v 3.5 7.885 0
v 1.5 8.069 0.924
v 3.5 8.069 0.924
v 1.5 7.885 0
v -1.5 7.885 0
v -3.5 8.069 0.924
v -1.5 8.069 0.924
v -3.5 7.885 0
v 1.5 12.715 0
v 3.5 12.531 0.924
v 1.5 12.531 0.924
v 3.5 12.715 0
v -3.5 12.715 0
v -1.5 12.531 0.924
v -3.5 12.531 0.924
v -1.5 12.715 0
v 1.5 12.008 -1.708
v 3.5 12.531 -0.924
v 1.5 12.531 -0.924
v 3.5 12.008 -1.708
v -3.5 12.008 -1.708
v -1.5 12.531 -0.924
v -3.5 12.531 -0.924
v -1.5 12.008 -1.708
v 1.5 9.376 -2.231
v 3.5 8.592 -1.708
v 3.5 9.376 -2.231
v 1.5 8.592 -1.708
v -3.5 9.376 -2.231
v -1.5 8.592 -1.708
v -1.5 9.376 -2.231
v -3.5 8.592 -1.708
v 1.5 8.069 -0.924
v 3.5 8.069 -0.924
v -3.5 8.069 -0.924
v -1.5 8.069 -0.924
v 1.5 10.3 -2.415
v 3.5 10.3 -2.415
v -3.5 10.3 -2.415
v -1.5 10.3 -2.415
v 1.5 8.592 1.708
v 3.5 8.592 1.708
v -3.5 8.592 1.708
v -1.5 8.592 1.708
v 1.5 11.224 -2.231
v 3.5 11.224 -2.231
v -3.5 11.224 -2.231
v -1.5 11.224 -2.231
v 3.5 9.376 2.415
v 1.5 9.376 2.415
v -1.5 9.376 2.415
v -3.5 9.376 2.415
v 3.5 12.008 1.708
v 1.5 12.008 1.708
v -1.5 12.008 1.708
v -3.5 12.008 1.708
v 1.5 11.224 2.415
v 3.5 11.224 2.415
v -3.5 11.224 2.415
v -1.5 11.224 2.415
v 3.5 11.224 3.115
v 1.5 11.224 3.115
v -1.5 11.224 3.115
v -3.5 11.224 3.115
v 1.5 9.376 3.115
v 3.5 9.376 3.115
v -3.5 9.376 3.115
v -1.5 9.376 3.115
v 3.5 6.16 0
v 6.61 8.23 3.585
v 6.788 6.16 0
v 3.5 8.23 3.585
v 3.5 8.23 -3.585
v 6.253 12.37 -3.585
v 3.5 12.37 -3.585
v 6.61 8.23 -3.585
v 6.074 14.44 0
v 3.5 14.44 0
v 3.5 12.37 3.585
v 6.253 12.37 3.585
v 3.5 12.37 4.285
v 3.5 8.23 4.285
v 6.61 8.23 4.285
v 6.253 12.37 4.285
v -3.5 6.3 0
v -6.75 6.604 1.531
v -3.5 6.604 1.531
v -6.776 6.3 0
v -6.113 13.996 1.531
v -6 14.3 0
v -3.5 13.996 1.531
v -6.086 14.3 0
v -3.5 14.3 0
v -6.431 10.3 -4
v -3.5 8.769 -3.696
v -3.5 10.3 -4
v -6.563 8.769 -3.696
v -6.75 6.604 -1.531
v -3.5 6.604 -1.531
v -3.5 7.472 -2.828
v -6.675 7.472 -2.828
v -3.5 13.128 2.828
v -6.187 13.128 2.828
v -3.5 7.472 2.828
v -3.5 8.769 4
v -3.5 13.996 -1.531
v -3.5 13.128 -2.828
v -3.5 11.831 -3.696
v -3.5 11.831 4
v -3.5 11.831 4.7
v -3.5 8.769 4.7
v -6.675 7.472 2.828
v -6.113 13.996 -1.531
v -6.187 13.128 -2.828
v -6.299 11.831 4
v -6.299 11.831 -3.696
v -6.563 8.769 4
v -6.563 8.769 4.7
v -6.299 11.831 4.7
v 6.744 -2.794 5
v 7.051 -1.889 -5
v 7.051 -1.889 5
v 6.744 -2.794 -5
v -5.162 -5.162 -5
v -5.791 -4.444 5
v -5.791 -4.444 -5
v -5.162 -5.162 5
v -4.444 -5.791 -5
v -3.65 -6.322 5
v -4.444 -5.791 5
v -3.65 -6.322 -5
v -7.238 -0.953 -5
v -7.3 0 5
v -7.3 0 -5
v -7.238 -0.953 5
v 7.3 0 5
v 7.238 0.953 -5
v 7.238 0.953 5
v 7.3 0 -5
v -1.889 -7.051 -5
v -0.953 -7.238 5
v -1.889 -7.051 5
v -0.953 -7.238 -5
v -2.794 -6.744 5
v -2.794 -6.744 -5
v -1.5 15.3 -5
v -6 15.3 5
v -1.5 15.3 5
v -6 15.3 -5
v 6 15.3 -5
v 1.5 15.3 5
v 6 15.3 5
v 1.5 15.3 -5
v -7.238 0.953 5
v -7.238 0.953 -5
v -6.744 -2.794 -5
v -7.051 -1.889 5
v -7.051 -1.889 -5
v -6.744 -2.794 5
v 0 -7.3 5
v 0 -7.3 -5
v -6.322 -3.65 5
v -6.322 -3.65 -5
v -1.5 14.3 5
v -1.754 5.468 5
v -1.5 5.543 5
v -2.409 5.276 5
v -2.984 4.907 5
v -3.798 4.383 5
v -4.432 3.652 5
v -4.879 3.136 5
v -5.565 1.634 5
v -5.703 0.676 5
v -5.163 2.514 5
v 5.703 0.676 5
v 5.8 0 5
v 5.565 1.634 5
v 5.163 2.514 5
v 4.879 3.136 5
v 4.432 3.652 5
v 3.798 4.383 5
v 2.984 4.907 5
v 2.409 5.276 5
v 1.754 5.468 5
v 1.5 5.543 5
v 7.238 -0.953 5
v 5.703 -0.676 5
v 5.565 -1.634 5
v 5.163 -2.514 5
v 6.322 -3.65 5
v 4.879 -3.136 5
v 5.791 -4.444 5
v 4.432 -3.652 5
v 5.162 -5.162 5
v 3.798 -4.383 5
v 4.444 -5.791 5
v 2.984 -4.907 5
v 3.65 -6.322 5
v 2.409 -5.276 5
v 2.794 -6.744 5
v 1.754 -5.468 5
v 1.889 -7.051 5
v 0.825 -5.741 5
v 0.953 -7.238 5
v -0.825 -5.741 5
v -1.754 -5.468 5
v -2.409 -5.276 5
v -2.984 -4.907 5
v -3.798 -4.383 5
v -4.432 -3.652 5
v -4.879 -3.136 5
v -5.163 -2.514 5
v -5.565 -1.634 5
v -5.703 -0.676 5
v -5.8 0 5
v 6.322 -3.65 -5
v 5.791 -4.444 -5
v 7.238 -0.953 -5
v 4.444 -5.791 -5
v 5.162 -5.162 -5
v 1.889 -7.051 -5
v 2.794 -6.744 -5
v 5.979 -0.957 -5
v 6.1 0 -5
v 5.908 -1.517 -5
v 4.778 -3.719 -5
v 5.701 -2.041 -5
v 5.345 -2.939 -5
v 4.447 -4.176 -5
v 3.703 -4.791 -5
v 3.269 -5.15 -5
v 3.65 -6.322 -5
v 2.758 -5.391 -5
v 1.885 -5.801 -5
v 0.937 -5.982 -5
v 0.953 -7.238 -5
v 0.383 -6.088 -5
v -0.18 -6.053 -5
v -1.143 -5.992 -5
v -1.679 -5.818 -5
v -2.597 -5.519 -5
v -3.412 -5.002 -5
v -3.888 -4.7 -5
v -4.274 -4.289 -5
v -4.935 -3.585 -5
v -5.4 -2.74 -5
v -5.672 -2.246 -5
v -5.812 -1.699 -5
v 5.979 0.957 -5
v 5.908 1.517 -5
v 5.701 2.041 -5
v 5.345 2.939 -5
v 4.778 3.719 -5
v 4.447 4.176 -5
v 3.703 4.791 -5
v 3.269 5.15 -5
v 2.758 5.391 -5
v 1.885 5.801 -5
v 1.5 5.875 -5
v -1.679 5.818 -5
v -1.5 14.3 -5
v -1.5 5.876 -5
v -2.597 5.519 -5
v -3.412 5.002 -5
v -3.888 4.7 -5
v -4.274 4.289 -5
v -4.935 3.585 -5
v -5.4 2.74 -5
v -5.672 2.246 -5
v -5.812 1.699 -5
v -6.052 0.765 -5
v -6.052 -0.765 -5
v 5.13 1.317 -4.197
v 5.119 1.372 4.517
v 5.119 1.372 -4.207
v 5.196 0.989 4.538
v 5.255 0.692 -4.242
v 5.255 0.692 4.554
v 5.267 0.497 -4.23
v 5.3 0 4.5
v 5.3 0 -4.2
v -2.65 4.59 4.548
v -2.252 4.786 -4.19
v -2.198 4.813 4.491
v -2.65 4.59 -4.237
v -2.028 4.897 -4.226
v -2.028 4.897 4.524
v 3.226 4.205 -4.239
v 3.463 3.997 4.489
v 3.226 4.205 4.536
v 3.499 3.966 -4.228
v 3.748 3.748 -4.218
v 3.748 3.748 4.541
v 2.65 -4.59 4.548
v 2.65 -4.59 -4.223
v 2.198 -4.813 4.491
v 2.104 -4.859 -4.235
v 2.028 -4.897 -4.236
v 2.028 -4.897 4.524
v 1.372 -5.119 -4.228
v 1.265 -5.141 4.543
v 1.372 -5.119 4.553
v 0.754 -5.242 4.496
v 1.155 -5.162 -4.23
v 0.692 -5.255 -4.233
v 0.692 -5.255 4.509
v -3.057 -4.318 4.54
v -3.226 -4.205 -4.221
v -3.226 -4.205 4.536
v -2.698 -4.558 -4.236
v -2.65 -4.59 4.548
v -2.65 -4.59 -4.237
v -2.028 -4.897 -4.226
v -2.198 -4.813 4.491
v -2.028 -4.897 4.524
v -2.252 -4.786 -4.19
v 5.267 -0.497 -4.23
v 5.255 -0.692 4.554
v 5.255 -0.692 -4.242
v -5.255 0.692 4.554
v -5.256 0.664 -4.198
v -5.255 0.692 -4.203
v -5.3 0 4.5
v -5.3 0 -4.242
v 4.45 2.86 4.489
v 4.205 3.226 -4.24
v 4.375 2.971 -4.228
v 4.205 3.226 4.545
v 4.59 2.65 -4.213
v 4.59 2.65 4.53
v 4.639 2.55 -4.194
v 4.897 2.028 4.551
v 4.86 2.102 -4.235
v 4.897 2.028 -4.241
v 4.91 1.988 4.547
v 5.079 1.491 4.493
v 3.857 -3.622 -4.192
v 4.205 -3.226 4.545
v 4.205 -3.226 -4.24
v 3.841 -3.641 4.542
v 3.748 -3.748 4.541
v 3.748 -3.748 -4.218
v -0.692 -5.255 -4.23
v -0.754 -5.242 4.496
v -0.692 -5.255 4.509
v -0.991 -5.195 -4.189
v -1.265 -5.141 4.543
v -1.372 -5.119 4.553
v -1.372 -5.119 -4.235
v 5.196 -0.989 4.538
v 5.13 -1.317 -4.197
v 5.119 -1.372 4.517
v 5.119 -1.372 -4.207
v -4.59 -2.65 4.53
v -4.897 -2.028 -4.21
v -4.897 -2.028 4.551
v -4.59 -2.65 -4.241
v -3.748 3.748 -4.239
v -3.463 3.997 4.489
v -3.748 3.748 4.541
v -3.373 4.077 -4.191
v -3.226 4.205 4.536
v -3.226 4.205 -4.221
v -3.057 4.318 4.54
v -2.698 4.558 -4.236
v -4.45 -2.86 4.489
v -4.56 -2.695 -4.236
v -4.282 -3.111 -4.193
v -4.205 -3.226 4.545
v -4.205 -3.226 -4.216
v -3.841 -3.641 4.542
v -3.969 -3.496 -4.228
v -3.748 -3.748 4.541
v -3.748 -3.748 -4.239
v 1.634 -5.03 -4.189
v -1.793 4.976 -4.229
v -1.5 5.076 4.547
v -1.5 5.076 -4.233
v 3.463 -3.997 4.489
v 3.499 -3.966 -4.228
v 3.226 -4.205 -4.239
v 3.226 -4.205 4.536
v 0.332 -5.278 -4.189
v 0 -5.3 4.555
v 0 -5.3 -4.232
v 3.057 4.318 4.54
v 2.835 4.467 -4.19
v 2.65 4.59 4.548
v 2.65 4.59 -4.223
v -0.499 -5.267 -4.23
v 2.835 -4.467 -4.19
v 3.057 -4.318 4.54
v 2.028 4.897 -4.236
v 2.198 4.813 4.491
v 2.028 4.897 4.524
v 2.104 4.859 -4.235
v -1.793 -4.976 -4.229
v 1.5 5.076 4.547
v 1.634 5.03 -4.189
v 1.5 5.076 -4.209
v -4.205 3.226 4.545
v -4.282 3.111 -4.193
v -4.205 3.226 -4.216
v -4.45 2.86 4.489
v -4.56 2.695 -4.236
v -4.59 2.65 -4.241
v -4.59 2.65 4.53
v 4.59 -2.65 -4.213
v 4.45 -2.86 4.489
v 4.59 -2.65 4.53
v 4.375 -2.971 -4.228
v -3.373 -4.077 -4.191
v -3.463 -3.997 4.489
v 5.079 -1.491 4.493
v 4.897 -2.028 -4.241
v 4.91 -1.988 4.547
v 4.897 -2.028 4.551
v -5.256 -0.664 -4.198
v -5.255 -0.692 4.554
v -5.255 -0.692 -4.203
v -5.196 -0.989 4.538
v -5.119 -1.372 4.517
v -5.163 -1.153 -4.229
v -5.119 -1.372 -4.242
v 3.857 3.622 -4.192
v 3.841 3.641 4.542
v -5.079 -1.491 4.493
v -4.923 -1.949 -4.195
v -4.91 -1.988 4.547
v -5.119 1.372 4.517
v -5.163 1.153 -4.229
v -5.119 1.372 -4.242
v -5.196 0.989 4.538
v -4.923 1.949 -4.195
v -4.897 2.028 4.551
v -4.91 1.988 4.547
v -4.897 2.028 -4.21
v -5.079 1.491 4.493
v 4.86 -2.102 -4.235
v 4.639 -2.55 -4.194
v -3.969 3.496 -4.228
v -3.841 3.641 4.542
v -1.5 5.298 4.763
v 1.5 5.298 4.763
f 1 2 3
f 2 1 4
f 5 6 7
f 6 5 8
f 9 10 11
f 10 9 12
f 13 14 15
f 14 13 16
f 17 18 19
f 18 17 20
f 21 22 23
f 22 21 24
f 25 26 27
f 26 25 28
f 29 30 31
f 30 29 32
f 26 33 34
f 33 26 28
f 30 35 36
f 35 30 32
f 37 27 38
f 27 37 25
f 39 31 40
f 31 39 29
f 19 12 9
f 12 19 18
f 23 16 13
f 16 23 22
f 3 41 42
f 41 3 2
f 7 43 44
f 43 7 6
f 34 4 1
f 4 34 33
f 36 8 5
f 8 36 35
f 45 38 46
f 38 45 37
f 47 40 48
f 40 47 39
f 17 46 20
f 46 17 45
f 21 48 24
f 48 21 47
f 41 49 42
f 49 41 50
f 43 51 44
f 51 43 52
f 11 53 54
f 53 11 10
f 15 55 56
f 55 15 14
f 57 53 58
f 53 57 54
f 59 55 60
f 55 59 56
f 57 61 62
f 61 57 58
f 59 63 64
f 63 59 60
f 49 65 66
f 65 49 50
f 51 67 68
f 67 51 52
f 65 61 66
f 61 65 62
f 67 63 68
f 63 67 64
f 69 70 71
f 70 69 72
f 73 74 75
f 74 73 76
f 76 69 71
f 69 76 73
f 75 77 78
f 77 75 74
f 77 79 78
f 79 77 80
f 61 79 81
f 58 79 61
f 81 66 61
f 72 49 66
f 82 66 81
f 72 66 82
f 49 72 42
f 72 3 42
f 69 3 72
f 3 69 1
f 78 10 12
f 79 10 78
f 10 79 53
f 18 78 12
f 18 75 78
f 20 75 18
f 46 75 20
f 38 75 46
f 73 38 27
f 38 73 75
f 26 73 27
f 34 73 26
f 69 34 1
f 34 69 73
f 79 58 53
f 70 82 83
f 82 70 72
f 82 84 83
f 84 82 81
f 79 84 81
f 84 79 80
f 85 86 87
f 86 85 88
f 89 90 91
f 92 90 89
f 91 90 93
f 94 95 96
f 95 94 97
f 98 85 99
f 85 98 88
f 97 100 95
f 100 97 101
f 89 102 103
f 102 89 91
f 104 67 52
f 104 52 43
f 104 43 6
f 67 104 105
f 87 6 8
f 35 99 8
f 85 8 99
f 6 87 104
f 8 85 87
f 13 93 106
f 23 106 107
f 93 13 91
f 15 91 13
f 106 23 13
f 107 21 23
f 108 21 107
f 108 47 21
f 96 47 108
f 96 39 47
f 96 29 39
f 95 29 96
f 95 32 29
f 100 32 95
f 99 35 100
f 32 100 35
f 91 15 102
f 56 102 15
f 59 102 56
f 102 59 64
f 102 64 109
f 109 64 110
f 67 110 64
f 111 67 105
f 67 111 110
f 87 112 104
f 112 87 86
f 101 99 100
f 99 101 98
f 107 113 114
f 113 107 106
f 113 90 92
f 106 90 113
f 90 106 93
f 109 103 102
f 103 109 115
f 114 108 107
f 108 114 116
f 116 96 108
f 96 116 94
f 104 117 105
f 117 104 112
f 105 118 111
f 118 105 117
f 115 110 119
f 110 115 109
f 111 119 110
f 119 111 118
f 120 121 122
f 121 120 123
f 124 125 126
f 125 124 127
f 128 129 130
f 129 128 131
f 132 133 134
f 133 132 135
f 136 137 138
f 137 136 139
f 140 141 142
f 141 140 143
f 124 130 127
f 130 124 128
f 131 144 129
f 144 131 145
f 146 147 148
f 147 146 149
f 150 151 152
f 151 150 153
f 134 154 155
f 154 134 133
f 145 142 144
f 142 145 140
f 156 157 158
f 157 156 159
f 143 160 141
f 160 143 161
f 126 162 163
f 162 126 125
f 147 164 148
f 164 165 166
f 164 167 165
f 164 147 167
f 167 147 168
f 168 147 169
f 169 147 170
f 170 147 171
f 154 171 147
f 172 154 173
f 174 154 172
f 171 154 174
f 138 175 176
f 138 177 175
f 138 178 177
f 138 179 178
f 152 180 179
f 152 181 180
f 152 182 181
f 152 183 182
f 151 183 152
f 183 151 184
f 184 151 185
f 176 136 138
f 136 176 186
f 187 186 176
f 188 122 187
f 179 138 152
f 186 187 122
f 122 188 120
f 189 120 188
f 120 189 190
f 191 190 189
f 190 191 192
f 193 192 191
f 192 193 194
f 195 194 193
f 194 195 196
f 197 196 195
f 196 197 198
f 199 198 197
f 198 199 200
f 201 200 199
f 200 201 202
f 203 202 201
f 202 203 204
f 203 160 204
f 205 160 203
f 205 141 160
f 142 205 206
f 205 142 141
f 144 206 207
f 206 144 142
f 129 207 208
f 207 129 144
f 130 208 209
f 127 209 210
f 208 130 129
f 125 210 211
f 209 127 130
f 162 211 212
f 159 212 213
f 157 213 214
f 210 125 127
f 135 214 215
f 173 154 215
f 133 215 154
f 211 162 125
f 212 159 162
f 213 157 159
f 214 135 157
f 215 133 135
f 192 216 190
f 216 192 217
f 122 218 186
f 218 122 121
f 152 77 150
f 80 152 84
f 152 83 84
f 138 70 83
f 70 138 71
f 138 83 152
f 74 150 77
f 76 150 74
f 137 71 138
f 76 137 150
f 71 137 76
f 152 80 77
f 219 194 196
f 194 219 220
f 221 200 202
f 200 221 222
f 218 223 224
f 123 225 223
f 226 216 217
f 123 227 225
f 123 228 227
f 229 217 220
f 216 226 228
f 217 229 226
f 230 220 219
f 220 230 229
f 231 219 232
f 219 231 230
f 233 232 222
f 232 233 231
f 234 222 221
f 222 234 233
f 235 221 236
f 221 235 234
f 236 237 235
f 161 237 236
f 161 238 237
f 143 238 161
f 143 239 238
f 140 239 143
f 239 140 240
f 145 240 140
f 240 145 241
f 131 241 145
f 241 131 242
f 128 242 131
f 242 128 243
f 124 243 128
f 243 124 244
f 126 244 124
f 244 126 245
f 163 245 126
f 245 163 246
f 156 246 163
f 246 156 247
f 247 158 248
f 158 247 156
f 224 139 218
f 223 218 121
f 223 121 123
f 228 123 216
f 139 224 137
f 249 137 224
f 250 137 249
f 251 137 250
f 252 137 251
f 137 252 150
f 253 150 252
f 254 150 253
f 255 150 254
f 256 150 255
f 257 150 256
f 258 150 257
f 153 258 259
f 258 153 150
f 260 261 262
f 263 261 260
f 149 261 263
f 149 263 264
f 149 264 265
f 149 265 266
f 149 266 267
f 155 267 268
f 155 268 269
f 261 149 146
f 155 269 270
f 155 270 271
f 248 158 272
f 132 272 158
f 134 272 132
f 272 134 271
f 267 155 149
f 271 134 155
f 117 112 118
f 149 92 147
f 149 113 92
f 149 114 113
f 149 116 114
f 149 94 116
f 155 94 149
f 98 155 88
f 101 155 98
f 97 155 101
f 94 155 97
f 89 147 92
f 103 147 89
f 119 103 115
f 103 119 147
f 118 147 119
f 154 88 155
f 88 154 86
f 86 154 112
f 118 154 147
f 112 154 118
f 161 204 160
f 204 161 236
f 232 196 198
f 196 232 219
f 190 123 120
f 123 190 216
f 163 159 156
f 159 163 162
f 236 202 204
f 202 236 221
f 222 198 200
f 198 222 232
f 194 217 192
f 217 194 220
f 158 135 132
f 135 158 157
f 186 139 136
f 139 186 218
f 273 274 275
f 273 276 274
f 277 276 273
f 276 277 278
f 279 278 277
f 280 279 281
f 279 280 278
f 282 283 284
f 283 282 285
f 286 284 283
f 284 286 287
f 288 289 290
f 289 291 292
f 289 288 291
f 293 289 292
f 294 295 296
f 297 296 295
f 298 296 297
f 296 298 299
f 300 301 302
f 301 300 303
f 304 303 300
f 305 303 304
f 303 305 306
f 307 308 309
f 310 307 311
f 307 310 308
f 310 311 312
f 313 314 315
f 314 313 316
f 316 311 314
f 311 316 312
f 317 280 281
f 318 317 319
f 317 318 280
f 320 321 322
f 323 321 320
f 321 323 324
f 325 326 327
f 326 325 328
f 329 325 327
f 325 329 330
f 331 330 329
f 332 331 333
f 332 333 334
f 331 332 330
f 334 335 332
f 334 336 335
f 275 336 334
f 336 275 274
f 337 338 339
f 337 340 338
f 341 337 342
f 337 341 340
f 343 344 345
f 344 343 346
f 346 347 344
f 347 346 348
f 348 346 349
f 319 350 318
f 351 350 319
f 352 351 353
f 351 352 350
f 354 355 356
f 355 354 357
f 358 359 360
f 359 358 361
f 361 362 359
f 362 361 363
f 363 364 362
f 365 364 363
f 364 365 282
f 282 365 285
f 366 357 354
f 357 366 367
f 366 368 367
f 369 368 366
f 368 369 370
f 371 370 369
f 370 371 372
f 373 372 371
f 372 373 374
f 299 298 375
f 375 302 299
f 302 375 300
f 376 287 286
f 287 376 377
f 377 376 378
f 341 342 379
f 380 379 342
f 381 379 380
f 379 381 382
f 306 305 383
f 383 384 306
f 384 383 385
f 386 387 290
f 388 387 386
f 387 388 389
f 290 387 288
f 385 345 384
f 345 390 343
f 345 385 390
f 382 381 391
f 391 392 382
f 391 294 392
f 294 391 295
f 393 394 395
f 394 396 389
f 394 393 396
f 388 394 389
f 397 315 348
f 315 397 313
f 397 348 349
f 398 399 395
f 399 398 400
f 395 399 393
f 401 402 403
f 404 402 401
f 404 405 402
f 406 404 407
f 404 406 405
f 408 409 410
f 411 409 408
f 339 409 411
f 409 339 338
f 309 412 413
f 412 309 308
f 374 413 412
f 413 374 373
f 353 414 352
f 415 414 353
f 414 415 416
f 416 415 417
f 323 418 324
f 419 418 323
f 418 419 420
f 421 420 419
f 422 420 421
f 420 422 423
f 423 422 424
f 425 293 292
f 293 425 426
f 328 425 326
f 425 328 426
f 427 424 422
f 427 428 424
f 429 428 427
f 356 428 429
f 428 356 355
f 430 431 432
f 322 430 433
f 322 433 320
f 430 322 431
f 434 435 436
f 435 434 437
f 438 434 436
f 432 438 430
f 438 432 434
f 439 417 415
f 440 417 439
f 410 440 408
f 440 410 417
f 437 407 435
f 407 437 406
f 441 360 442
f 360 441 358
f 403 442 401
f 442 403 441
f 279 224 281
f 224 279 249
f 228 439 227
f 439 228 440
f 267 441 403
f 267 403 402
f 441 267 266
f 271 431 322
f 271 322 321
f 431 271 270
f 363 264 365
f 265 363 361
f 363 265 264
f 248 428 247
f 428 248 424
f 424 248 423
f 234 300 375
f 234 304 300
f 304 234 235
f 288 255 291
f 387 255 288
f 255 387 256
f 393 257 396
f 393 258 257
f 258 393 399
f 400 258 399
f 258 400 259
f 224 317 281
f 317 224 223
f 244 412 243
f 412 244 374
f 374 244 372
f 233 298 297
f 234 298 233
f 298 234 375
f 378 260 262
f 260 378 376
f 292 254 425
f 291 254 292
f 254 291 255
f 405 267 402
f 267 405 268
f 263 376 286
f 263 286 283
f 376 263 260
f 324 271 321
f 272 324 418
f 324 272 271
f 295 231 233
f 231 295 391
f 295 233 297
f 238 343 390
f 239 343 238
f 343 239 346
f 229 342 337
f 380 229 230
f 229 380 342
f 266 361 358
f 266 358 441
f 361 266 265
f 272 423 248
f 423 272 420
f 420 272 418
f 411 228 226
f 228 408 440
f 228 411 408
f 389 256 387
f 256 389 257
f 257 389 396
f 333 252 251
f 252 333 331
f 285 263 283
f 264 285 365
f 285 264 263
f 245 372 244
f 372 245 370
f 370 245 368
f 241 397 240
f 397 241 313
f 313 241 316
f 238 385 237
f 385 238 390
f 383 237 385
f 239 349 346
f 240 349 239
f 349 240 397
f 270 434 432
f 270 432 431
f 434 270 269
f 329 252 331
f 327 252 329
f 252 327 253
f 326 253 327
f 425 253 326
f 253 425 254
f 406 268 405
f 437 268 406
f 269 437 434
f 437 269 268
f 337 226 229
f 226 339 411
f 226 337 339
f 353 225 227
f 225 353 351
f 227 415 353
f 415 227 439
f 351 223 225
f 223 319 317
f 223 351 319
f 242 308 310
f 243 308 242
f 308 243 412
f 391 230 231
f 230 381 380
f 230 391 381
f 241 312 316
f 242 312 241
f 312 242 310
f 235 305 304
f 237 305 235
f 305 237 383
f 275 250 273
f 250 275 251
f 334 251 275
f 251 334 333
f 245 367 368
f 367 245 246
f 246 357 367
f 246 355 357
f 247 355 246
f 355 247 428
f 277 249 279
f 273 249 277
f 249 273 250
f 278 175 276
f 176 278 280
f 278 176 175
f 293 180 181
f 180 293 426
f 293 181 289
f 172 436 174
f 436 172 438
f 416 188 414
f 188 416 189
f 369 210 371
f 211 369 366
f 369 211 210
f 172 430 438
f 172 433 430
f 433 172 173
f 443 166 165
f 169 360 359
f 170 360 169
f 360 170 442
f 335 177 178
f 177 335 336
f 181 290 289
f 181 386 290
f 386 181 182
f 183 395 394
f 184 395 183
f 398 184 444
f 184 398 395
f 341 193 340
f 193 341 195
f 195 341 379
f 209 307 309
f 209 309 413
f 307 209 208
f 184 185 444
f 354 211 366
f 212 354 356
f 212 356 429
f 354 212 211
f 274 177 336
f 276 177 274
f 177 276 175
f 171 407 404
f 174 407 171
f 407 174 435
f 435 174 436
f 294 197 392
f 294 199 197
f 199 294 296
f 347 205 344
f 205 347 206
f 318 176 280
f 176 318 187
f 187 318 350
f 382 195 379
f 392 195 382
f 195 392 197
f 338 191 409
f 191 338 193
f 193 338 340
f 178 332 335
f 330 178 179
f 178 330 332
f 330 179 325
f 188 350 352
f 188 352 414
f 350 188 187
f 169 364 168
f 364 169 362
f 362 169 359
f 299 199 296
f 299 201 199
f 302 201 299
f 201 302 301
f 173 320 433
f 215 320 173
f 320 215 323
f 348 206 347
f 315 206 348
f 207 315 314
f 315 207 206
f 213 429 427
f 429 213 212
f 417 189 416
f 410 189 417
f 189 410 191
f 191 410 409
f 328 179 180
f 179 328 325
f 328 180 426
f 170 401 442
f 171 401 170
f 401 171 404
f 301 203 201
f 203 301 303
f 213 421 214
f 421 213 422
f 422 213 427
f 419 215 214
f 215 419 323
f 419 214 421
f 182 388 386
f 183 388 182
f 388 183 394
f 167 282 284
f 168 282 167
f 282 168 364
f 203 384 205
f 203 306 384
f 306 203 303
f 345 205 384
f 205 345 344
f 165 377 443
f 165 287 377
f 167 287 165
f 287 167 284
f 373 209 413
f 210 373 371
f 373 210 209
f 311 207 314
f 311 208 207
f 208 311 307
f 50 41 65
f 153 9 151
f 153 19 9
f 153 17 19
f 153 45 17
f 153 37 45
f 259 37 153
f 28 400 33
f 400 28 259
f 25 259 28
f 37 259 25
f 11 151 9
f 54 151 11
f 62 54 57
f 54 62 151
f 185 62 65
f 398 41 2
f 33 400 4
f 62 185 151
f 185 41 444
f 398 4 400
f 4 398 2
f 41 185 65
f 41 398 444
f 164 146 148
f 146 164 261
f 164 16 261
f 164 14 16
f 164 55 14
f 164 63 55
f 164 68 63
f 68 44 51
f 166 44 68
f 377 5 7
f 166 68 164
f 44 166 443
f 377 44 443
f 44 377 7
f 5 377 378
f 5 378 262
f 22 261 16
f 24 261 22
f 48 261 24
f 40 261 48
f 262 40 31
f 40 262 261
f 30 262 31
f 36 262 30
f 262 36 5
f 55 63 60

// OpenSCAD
// file: cylinder_clip.scad
use <../utilities.scad>;

module cylinder_clip(r=1,t=3,opening_angle=120,wing_length=2,wing_angle=45,flat_w=10,flat_t=3,h=10,$fn=$fn){
	union(){
		difference(){
			hull(){
				cylinder(r=r+t,$fn=$fn,h=h);
				translate([-flat_w/2,-r-flat_t,0]) cube([flat_w,0.1,h]);
			}
			cylinder(r=r,$fn=$fn,h=99999,center=true);
			cylinder(r1=r+2,r2=r,$fn=$fn,h=2,center=true);
			scale([tan(opening_angle/2),1,1]) rotate([0,0,45]) translate([0,0,-1]) cube([1,1,1]*9999);
		}
		reflect([1,0,0]) translate([sin(opening_angle/2),cos(opening_angle/2),0]*(r+t/2)) hull() repeat([sin(wing_angle),cos(wing_angle),0]*wing_length,2)
			cylinder(r=t/2,h=h,$fn=16);
			
	}
}

//cylinder_clip(r=3,t=2,flat_w=6);
union(){
	cylinder_clip(r=21,t=4.5,flat_t=10,opening_angle=100,$fn=64);
	translate([-5,-22-5-20,0]) cube([10,20,10]);
}
// file: ../standard_optomechanics/cylinder_clamp.scad
use <../utilities.scad>;
d=0.05;

//for 1 inch/25mm post clamp, an inner radius of 12.8 is good.
	
module cylinder_clamp(
	inner_r=12.8, //radius of the cylinder being clamped (ish!)
	clamp_h=11, //thicknedess of the clamp along the cylinder axis
	clamp_t=4, //thickness of the clamp radially
	flat_t=8, //how thick the bottom of the clamp is (often need to allow for the mounting bolt head here)
	flat_width=15, //width of the flat base
	mounting_bolt=4, //nominal size of mounting bolt (default is 4 for M4, 0 to disable)
	nut_trap=false,
	bevel_top=0.5, //size of 45 degree bevel on top surface
	bevel_bottom=0.8 //size of 45 degree bevel on bottom of hole
	){
	assign(
		post_r = inner_r, //poor initial choice of name!
		bolt_flat_w=10, //width of the region where the bolt is
		gap_w=3 //size of the gap that is squeezed by the bolt
	)
	difference(){
		hull(){
			cylinder(h=clamp_h,r=post_r+clamp_t,center=true,$fn=48);
			translate([0,-post_r-flat_t/2,0]) cube([flat_width,flat_t,clamp_h],center=true);
			translate([0,post_r+bolt_flat_w/2,0]) cube([12,bolt_flat_w,clamp_h],center=true);
		}
	
		cylinder(h=9999,r=post_r,center=true,$fn=48); //cylinder being clamped
		//bevels, top and bottom
		translate([0,0,-clamp_h/2]) cylinder(r1=post_r+3*bevel_bottom,r2=post_r-bevel_bottom,h=4*bevel_bottom,center=true);
		translate([0,0,clamp_h/2]) cylinder(r2=post_r+3*bevel_top,r1=post_r-bevel_top,h=4*bevel_top,center=true);
		//gap (squeezed by bolt)
		translate([0,999,0]) cube([gap_w,999*2,999],center=true); //gap
	
		//clamping bolt
		translate([gap_w/2+2,post_r+bolt_flat_w/2,0]) rotate([0,0,-90]) nut_y(4,h=999,shaft=true);
		translate([-gap_w/2-2,post_r+bolt_flat_w/2,0]) rotate([0,0,90]) cylinder_with_45deg_top(r=4,h=999,$fn=16); //counterbore for nut head
	
		if(mounting_bolt > 0){
			//mounting bolt
			translate([0,-post_r-4.5,0]) rotate([-90,0,0]){
				intersection(){
					rotate([90,0,0])
						if(nut_trap){
							nut_y(mounting_bolt,fudge=1.15,shaft=true,h=999);
						}else{
							screw_y(mounting_bolt,fudge=1.07,shaft=true,h=999);
						}
					cube([inner_r*2,inner_r*2,clamp_h*2],center=true);
				}
			}
		}
		//in the case of thick clamps with thin flats, this keeps the bottom flat
		translate([0,-inner_r-flat_t-999,0]) cube([9999,999*2,9999],center=true);
	}
}

module cylinder_clamp_v(
	inner_r=12.8, //radius of the cylinder being clamped (ish!)
	clamp_h=10, //width of the clamp along the cylinder (y) axis
	clamp_t=4, //thickness of the clamp radially
	flat_t=8, //how thick the bottom of the clamp is (often need to allow for the mounting bolt head here)
	flat_width=15, //width of the flat base
	mounting_bolt=4, //nominal size of mounting bolt (default is 4 for M4, 0 to disable)
	bevel=0.5 //put a 45 degree bevel on the edges of the hole
	){
	assign(
		post_r = inner_r, //poor initial choice of name!
		bolt_flat_w=11, //width of the region where the bolt is
		gap_w=2*inner_r*sin(45/2),//sin(acos(1-(9/2-4/2*1.22)/inner_r))*inner_r //size of the gap that is squeezed by the bolt
		bolt_z = inner_r+4/2*1.22+d //position of bolt (so bolt just clears the cylinder we're clamping
	)assign( //the second assign statement allows us to use gap_w
		bolt_span=gap_w+4+d//max(2*inner_r*sin(acos(1-(9/2-4/2*1.22)/inner_r)), gap_w+4)
	)
	difference(){
		hull(){
			rotate([90,0,0]) cylinder(h=clamp_h,r=inner_r+clamp_t,center=true,$fn=48);
			translate([0,0,-inner_r-flat_t/2]) cube([flat_width,clamp_h,flat_t],center=true);
			translate([0,0,bolt_z]) cube([gap_w+9,clamp_h,bolt_flat_w],center=true);
		}
	
		cylinder_with_45deg_top(h=9999,r=post_r,center=true,$fn=48); //cylinder being clamped
		reflect([0,1,0]) translate([0,clamp_h/2,0]) rotate([90,0,0]) cylinder(r1=post_r+3*bevel,r2=post_r-bevel,h=4*bevel,center=true); //bevel
		translate([0,0,999]) cube([gap_w,999,999*2],center=true); //gap
	
		//clamping bolt
		translate([bolt_span/2,0,bolt_z]) rotate([0,0,-90]) nut_y(4,h=999,shaft=true);
		translate([-bolt_span/2,0,bolt_z]) rotate([0,0,90]) cylinder_with_45deg_top(r=4,h=999,$fn=16); //counterbore for nut head
	
		if(mounting_bolt > 0){
			//mounting bolt
			translate([0,0,-post_r-4.5]){
				cylinder(r=mounting_bolt*1.1,h=post_r,$fn=16);
				cylinder(r=mounting_bolt/2*1.22,h=flat_t*2,center=true,$fn=16);
			}
		}
		translate([0,0,-inner_r-flat_t-999]) cube([9999,9999,999*2],center=true);
	}
}

translate([0,30,0]) cylinder_clamp_v(30.5/2, 10, flat_width=24, mounting_bolt=4, flat_t=8);

cylinder_clamp(30.5/2, flat_width=24, mounting_bolt=4, flat_t=8,nut_trap=true);
// main file
use <../utilities.scad>;
use <../standard_optomechanics/cylinder_clamp.scad>;
use <./cylinder_clip.scad>;

rack_r = 10/2+0.3;
lock_pos = [15,30,0];
h=10;

union(){
    cylinder_clamp(
        inner_r=rack_r, //radius of the cylinder being clamped (ish!)
        clamp_h=h, //thicknedess of the clamp along the cylinder axis
        clamp_t=2, //thickness of the clamp radially
        flat_t=2, //how thick the bottom of the clamp is (often need to allow for the mounting bolt head here)
        flat_width=0, //width of the flat base
        mounting_bolt=0, //nominal size of mounting bolt (default is 4 for M4, 0 to disable)
        nut_trap=false
        );
    
    translate([-6,rack_r+9,-h/2]) cube([4.5,1,h]);
}
